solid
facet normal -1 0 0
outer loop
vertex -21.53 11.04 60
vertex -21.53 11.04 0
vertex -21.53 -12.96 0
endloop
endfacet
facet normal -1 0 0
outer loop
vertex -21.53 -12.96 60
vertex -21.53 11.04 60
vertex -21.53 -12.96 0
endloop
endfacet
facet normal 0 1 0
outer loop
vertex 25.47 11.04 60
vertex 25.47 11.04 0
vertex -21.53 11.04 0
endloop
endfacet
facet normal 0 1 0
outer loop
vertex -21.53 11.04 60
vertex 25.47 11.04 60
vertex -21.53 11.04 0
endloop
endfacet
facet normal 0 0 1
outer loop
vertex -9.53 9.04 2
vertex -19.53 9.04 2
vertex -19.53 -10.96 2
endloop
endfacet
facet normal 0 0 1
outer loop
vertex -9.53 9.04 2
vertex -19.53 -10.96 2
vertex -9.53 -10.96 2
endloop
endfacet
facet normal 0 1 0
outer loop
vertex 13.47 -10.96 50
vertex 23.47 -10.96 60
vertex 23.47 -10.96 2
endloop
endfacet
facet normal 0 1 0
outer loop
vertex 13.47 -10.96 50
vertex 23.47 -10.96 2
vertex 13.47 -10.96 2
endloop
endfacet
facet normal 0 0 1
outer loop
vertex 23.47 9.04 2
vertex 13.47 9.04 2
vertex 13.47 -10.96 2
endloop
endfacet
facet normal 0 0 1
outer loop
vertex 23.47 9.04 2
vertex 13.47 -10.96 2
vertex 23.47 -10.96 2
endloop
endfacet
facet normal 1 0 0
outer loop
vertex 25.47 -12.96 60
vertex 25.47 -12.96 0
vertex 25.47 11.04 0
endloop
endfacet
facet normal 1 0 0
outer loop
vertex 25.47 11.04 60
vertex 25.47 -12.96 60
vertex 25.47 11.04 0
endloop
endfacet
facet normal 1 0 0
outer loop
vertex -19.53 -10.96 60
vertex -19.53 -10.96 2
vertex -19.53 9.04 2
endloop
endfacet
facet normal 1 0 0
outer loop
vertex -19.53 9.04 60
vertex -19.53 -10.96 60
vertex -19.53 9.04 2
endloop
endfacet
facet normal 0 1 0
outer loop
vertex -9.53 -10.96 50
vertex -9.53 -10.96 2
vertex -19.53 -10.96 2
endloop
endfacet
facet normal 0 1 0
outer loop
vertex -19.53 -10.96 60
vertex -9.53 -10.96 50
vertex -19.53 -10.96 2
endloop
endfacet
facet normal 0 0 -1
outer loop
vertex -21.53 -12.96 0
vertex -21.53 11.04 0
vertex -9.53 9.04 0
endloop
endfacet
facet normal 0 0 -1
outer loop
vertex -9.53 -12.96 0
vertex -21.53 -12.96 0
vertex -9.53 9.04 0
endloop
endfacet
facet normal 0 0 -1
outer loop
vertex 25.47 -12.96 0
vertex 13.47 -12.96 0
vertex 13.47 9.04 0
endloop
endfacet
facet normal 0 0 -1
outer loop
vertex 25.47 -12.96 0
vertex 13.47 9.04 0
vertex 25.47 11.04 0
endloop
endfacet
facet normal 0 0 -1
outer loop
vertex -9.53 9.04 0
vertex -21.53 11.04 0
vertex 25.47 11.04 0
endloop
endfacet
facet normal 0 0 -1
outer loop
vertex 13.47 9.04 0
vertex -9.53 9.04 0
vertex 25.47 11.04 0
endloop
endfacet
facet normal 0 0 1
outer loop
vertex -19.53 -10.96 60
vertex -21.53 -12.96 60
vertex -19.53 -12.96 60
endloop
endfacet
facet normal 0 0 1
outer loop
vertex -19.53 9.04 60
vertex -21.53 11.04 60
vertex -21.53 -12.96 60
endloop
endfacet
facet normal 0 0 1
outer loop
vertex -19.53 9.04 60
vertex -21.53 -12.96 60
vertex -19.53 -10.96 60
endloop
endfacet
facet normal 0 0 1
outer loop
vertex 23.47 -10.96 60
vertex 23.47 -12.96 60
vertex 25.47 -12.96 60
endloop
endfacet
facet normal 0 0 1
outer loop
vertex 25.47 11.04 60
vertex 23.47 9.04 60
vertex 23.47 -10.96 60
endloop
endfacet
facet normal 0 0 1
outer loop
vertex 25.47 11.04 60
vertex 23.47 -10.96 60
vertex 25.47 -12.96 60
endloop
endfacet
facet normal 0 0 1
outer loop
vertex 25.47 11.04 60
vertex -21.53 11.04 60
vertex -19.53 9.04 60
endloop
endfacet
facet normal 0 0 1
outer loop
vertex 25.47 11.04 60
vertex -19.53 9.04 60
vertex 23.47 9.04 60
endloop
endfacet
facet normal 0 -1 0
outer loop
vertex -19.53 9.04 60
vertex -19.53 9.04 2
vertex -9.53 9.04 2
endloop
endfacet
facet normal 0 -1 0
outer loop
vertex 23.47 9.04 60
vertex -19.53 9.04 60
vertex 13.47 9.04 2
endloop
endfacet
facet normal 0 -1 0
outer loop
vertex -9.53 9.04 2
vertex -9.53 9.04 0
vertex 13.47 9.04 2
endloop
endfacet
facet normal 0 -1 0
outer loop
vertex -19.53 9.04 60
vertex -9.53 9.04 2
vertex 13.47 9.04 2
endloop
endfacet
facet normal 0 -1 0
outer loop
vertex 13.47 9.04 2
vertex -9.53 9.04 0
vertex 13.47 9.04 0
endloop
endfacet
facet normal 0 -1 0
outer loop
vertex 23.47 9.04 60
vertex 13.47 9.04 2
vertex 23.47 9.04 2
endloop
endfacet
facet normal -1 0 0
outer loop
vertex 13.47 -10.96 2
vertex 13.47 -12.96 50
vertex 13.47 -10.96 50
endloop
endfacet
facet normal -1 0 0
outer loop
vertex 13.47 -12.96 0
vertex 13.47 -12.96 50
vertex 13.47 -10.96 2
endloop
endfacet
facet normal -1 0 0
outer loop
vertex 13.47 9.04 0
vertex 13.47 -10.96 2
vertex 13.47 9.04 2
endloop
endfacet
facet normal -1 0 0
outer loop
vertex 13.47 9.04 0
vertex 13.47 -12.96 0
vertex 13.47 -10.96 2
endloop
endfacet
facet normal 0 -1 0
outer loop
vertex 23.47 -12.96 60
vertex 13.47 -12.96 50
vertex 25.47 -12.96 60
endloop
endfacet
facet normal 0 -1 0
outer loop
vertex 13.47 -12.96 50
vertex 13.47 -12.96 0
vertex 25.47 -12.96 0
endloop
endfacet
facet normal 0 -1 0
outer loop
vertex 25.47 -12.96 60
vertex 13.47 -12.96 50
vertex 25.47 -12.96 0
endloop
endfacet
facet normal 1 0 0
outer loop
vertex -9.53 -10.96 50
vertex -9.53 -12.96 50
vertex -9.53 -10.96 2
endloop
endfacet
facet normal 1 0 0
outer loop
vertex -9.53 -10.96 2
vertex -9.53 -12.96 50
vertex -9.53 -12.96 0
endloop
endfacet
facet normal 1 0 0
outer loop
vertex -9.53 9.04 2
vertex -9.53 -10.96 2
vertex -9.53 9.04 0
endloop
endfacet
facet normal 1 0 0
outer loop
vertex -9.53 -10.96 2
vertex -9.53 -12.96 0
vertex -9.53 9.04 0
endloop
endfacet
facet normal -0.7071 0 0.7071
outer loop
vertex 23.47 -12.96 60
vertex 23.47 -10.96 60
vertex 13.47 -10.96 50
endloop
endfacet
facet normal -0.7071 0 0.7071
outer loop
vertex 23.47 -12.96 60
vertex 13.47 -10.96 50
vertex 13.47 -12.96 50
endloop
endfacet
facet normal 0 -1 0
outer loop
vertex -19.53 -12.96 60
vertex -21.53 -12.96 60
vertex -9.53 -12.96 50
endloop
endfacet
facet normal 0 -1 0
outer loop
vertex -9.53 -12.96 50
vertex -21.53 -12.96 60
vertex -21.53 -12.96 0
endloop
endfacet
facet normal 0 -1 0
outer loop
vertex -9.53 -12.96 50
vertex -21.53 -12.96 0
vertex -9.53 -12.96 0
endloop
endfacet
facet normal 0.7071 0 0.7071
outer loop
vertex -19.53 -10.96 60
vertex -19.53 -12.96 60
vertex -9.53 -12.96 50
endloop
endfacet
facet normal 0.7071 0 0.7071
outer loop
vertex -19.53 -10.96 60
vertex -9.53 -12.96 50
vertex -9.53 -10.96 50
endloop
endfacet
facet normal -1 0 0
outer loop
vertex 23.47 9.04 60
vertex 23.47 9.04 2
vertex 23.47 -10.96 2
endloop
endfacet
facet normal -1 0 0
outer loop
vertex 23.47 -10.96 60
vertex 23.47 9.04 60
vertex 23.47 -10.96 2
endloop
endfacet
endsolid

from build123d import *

# Parameters (mm, degrees)
F1_DEPTH = 60
F0_W     = 10
F0_H     = 20
F2_DEPTH = 2
F3_SIZE  = 10


with BuildPart() as f1:
    # F0 (on Top) → F1 (new body)
    with BuildSketch(Plane.XY):
        Polygon((-19.530129, -10.959504), (-19.530129, 9.040496), (-9.530129, 9.040496), (13.469871, 9.040496), (23.469871, 9.040496), (23.469871, -10.959504), (13.469871, -10.959504), (13.469871, -12.959504), (25.469871, -12.959504), (25.469871, 11.040496), (-21.530129, 11.040496), (-21.530129, -12.959504), (-9.530129, -12.959504), (-9.530129, -10.959504), align=None)
    extrude(amount=F1_DEPTH)

    # F0 (on Top) → F2 (join)
    with BuildSketch(Plane.XY):
        with Locations((-14.530129, -0.959504)):
            Rectangle(F0_W, F0_H)
        with Locations((18.469871, -0.959504)):
            Rectangle(F0_W, F0_H)
    extrude(amount=F2_DEPTH)

    # F3
    f3_edges = [f1.edges().sort_by_distance(p)[0] for p in [
        (-9.530129, -11.959504, 60),
        (13.469871, -11.959504, 60),
    ]]
    chamfer(f3_edges, length=F3_SIZE)


solid = f1.part
